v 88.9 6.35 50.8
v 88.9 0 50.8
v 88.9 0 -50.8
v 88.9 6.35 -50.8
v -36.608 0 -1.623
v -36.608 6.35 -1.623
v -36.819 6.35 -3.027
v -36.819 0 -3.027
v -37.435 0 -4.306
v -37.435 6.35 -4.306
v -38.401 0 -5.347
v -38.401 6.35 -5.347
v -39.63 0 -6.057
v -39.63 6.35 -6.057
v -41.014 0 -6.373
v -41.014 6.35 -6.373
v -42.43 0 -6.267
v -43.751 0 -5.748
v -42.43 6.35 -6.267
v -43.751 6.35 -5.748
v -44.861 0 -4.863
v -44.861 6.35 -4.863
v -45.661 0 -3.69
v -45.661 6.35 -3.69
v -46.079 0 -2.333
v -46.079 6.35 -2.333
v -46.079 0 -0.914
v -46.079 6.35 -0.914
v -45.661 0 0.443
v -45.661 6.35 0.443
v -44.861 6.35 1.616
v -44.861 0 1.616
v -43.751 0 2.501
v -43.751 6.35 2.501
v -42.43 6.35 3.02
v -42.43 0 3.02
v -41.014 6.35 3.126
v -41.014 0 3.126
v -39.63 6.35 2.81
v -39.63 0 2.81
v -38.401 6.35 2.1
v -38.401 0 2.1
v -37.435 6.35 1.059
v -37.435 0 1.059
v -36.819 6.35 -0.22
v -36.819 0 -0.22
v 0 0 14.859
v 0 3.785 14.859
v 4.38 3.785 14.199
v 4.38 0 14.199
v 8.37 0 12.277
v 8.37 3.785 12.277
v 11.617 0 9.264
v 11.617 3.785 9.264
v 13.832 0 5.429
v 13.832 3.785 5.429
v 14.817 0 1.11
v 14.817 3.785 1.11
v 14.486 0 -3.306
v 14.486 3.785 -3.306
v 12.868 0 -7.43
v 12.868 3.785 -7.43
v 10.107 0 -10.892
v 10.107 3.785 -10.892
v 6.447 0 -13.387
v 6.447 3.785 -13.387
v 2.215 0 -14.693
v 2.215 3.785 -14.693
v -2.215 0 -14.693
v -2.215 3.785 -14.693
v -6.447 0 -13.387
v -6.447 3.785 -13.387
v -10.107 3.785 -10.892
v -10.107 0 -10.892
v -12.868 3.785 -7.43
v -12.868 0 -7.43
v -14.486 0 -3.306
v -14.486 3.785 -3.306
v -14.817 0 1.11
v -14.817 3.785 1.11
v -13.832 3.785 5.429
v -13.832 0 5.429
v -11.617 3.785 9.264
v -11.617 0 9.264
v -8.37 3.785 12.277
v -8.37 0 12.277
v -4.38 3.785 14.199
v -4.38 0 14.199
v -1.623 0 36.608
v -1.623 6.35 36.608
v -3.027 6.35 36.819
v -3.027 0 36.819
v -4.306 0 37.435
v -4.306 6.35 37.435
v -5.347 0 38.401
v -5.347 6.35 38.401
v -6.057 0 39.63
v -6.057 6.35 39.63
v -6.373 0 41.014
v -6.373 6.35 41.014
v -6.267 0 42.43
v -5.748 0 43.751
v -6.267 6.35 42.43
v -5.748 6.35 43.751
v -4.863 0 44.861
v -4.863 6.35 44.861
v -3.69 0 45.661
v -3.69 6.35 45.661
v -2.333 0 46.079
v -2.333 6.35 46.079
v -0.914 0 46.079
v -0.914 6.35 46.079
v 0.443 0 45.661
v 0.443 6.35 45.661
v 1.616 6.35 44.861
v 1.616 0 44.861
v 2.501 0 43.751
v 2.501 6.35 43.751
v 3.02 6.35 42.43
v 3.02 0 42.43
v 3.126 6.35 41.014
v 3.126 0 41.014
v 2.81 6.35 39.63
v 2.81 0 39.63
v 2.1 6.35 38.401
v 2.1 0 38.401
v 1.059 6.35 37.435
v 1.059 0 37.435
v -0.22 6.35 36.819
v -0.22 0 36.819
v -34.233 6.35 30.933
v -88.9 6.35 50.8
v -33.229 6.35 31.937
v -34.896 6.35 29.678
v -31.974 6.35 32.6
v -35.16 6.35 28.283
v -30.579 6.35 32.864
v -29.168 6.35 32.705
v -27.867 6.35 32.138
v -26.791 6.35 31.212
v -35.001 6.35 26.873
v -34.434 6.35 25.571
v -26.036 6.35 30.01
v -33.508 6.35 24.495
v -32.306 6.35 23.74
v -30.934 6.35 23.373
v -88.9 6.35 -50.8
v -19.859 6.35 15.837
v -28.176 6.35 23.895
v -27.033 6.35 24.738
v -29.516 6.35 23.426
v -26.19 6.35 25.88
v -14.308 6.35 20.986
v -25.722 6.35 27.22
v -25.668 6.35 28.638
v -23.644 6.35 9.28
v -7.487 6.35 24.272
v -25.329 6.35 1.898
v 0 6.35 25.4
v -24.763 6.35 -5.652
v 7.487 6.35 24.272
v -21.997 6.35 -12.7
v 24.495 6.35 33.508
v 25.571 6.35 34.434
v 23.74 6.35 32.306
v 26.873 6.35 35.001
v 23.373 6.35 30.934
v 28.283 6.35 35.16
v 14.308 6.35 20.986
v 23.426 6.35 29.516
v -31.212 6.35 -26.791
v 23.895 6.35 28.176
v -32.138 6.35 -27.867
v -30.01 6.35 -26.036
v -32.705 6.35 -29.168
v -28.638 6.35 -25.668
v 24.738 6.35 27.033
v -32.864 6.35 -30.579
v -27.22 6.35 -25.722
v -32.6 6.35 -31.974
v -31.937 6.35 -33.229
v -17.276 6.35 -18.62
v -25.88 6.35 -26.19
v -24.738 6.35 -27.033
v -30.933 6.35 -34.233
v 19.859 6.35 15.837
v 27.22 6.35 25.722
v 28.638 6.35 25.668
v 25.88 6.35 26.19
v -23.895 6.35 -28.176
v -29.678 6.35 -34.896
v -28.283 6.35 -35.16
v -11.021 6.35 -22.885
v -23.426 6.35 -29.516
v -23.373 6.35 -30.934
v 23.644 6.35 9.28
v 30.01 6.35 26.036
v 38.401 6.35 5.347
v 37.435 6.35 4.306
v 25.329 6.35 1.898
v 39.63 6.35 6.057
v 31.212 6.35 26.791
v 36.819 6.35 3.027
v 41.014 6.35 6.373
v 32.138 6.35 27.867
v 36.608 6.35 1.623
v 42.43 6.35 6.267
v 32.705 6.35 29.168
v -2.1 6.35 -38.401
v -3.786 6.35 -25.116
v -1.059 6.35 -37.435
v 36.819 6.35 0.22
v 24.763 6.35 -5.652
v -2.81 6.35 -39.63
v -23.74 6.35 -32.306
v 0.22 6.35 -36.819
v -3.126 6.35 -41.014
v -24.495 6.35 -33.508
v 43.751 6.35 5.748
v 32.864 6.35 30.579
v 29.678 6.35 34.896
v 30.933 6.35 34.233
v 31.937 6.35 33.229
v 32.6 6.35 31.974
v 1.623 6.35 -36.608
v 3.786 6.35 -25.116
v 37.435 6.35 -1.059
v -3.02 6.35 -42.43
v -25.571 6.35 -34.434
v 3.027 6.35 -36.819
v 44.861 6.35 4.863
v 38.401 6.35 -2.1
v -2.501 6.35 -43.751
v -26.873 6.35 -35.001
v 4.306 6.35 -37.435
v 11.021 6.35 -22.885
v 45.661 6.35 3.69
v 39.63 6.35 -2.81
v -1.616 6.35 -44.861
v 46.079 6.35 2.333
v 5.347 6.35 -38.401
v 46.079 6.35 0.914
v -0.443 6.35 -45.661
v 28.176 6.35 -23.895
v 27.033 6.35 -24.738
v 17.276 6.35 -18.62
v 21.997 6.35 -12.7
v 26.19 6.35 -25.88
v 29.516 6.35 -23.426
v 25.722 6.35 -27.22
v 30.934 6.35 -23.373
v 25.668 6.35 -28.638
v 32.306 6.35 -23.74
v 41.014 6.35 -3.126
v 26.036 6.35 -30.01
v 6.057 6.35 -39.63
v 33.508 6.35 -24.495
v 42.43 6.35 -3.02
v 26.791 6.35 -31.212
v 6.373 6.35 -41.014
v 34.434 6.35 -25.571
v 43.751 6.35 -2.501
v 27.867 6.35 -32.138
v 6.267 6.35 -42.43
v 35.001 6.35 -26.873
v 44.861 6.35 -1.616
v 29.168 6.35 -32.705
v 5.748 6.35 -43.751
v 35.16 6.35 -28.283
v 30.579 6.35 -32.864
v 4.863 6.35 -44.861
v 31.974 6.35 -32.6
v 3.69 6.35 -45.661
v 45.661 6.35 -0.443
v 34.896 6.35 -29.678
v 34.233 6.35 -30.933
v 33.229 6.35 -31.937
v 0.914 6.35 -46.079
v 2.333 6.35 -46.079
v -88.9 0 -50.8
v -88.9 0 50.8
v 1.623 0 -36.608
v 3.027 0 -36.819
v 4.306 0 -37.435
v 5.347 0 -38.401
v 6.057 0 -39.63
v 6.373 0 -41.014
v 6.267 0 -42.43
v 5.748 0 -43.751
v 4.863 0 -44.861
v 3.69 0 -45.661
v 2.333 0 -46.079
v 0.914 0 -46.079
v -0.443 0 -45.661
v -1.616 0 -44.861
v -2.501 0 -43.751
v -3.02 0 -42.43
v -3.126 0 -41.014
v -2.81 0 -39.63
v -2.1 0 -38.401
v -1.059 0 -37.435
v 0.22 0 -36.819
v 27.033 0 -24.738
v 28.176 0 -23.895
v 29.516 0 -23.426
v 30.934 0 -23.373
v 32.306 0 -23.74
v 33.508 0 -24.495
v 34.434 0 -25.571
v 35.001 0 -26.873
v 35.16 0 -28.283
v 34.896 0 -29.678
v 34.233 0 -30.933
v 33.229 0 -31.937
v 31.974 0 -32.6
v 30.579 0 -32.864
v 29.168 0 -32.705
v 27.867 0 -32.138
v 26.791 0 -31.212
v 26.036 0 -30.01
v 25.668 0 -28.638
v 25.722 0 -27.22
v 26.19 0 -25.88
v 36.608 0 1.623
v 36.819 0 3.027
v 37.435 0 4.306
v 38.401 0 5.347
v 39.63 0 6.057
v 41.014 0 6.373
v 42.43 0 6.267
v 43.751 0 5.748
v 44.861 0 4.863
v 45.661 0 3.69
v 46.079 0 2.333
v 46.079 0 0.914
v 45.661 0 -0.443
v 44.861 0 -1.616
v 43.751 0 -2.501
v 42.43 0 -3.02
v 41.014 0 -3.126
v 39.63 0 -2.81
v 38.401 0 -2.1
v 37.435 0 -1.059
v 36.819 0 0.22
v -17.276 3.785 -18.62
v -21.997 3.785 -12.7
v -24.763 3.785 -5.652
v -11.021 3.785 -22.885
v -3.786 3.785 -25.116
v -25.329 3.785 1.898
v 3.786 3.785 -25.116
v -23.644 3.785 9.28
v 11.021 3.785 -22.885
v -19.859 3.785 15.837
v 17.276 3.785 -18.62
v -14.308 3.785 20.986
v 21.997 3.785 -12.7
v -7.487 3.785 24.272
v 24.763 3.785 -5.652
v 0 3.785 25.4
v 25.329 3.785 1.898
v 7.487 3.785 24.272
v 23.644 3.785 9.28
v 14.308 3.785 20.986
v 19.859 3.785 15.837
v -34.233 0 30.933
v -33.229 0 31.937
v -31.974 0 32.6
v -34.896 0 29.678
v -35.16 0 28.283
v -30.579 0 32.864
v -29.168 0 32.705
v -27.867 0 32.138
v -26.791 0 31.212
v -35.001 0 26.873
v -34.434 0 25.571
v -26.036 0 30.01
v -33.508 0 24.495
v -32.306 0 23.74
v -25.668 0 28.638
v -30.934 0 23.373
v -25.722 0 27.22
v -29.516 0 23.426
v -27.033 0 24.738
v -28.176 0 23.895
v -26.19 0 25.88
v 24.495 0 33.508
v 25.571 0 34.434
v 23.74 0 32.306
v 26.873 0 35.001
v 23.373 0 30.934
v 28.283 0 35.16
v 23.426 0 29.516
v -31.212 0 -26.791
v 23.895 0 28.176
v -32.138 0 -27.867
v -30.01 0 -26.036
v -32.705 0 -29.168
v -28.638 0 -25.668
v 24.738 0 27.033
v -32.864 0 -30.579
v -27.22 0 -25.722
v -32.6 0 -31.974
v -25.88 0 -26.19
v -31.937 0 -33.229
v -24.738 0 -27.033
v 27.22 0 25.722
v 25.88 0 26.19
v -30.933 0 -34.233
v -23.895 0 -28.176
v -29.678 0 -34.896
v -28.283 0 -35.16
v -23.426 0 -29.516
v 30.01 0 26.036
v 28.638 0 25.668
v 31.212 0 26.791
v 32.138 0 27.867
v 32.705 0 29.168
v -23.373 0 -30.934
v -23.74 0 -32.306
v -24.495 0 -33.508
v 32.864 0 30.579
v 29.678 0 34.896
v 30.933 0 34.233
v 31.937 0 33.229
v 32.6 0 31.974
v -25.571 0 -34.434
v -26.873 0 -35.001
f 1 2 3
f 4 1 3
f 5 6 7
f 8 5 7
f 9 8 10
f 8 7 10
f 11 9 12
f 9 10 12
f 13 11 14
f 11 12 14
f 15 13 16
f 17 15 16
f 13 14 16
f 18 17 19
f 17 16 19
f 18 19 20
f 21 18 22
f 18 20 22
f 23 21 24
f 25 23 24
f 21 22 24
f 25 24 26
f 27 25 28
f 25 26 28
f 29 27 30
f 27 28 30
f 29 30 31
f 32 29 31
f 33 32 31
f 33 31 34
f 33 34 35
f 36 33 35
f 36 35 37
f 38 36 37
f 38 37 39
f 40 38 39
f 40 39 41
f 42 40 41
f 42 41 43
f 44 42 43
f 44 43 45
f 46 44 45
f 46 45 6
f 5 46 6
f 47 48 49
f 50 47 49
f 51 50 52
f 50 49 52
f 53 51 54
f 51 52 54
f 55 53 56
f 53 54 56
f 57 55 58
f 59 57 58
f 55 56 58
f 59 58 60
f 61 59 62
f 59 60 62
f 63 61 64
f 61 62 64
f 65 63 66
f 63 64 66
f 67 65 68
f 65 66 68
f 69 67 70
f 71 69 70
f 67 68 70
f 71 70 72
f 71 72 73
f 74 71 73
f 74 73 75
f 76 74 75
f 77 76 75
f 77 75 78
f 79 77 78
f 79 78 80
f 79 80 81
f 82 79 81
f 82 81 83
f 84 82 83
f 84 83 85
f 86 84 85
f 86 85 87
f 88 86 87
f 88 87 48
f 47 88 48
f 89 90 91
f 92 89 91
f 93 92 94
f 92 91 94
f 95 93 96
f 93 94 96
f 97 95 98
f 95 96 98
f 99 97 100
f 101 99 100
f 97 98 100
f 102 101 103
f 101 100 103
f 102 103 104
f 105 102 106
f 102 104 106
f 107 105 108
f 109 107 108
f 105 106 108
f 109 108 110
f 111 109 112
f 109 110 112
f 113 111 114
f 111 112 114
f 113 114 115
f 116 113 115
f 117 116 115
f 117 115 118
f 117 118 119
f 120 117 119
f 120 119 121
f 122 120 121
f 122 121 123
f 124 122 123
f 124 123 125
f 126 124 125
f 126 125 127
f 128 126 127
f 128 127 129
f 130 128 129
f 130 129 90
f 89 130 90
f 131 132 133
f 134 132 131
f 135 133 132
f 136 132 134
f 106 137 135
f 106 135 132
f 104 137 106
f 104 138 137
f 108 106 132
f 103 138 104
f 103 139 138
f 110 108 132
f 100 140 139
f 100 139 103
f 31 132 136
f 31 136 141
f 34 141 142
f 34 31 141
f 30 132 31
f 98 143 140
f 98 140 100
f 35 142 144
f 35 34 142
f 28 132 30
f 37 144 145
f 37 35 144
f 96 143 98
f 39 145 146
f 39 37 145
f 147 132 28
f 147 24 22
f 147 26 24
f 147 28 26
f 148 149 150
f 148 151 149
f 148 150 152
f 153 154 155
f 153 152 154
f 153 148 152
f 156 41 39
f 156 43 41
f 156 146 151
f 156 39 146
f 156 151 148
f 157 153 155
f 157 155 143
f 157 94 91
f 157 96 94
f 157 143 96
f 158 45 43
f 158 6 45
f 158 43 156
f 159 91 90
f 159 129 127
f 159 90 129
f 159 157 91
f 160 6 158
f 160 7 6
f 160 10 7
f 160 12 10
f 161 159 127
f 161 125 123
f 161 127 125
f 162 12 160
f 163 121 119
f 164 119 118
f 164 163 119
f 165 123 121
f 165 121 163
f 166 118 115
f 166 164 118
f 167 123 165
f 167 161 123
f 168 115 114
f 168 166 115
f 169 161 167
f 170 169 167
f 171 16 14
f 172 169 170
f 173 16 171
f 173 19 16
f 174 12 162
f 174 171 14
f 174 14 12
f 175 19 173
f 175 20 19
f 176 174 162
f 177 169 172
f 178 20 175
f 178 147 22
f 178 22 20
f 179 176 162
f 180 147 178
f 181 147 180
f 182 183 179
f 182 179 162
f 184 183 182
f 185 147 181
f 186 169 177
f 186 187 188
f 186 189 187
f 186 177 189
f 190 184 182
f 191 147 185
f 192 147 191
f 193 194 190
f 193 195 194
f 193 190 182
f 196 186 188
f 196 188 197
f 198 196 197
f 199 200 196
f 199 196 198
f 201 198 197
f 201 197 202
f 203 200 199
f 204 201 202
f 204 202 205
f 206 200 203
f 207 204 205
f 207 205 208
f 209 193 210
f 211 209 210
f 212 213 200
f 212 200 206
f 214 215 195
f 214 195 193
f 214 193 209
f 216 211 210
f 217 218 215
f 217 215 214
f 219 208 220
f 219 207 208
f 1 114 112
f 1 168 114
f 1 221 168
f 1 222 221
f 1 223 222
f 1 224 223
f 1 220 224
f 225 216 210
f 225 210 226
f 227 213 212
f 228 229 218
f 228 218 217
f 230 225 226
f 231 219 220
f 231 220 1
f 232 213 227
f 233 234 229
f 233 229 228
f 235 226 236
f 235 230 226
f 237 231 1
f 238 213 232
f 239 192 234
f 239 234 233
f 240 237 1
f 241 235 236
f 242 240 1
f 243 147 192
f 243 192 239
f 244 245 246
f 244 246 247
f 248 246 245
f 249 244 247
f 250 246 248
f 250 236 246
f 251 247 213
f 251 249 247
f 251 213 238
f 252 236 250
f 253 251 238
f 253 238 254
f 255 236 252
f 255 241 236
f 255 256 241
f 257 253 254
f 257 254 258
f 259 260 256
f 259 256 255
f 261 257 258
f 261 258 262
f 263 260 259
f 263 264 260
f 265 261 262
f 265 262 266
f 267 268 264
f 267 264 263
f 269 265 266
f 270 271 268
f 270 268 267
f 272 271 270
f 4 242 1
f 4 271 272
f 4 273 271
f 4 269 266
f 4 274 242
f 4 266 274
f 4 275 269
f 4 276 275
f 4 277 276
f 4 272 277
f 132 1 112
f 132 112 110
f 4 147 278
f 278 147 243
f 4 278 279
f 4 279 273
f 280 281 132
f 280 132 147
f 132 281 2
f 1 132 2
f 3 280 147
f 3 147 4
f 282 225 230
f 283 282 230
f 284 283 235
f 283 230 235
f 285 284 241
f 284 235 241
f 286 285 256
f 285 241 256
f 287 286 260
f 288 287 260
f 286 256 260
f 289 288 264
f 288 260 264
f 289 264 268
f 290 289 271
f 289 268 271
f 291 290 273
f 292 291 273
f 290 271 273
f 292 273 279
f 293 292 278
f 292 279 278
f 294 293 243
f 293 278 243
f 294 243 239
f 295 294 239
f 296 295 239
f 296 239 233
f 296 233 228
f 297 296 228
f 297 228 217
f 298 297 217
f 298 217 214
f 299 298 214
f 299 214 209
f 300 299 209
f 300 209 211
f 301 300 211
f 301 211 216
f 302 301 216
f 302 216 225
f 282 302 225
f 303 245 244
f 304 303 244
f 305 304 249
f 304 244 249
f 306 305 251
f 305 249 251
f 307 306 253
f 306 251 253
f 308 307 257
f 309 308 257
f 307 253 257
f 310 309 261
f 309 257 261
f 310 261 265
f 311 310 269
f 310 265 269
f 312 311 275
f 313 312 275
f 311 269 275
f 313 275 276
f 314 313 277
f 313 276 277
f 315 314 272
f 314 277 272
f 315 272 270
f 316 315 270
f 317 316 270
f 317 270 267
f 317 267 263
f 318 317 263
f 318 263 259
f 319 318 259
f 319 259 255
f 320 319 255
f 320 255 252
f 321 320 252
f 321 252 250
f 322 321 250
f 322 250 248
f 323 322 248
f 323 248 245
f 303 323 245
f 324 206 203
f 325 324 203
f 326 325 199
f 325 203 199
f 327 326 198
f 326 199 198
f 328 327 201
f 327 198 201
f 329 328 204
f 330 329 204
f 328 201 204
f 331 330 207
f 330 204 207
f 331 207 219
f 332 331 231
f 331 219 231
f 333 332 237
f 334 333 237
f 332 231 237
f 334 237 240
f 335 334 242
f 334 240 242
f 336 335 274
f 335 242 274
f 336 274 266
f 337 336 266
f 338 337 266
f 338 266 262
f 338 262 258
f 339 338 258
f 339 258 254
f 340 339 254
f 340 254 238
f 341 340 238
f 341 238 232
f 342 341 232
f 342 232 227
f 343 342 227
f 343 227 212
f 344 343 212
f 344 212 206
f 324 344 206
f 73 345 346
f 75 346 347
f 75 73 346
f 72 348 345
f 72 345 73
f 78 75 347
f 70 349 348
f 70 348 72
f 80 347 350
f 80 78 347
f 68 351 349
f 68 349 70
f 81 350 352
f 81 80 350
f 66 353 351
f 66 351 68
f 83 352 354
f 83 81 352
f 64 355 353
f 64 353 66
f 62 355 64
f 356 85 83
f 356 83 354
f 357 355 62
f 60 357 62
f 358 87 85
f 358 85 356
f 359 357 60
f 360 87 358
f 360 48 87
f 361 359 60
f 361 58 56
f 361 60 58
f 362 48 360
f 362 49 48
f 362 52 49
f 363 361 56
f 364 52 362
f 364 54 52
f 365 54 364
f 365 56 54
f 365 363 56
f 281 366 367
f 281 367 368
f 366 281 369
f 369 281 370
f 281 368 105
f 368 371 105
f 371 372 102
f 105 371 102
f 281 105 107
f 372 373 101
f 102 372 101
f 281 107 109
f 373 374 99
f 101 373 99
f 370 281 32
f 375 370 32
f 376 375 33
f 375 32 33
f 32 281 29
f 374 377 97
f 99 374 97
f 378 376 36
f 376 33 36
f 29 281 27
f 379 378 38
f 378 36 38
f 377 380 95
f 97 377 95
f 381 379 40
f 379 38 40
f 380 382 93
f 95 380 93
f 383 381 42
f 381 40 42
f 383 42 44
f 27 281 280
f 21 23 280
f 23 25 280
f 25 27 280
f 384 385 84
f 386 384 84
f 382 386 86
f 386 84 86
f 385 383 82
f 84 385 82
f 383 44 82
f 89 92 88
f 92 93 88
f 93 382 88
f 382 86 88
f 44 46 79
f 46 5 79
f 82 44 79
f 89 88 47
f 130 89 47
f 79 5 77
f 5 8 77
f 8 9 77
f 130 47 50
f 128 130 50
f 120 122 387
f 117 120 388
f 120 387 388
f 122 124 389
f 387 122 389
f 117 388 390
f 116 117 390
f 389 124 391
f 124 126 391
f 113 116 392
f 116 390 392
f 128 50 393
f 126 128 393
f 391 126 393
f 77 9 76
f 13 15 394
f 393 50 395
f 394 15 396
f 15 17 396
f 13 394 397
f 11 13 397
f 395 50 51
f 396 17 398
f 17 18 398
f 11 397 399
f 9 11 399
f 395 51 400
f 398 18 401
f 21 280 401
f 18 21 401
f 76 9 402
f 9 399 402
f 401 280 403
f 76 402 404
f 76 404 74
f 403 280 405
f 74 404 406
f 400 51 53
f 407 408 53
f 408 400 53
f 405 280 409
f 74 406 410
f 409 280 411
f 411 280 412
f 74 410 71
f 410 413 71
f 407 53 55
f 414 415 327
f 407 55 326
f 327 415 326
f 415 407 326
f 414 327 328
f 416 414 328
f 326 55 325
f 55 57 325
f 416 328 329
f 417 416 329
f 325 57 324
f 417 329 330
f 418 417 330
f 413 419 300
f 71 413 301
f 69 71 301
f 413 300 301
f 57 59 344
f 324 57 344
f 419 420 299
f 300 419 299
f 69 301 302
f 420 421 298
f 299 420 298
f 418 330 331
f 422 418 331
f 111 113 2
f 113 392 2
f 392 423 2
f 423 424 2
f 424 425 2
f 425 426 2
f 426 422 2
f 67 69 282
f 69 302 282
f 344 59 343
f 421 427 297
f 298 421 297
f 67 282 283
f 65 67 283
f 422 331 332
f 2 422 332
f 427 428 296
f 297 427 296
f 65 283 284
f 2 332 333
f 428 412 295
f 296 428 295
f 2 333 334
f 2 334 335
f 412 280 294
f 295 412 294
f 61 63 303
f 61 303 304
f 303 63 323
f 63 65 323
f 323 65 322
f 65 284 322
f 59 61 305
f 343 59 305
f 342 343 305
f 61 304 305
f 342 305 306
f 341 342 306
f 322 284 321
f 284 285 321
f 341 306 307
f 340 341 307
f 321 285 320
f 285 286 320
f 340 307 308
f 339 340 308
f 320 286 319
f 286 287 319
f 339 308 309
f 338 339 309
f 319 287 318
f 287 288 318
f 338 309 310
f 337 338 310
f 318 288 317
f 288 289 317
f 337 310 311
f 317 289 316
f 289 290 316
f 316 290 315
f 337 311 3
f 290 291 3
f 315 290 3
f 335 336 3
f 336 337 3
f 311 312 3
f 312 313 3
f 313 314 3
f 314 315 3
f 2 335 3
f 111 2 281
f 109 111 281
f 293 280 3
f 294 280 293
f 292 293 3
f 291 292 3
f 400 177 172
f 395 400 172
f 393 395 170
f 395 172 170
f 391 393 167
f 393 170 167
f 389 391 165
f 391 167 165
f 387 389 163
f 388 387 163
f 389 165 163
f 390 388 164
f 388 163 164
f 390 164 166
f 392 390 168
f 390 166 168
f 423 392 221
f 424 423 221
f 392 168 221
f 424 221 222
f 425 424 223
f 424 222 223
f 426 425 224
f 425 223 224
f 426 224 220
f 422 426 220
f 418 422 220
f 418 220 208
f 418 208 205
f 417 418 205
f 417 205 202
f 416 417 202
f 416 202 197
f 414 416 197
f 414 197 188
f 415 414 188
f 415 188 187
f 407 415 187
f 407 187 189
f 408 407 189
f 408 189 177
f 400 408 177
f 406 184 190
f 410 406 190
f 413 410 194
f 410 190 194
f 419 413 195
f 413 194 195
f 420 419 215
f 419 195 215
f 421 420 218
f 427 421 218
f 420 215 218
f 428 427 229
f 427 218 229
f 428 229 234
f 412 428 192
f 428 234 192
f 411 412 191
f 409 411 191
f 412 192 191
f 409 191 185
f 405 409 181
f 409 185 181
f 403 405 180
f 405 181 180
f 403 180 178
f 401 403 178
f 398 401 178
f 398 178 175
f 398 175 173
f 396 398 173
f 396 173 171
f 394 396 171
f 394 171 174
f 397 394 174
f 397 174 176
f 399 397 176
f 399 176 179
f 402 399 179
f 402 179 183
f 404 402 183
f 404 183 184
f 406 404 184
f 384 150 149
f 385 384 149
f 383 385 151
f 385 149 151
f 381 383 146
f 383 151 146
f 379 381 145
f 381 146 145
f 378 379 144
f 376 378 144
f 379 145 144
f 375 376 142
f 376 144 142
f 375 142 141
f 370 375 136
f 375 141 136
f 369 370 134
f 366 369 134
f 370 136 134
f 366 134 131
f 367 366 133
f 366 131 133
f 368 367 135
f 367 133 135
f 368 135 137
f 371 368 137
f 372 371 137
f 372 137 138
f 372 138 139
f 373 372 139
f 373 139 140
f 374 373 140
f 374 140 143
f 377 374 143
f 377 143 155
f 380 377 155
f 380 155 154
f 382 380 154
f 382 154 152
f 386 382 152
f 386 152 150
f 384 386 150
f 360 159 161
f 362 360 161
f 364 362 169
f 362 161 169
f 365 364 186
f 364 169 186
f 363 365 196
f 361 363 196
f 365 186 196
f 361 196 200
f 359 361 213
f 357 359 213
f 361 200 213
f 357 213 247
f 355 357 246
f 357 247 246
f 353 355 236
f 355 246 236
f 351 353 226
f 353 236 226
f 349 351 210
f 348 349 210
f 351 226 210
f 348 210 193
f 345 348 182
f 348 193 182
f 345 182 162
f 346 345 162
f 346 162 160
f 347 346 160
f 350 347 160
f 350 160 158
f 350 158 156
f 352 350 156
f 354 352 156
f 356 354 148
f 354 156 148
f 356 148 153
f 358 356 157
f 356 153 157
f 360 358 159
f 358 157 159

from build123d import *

# Parameters (mm, degrees)
SKETCH1_W           = 177.8
SKETCH1_H           = 101.6
BOSS_EXTRUDE1_DEPTH = 6.35
SKETCH2_R           = 14.859
CUT_EXTRUDE1_DEPTH  = 6.35
SKETCH3_R           = 25.4
CUT_EXTRUDE2_DEPTH  = 2.5654
SKETCH4_R           = 4.7625
CUT_EXTRUDE3_DEPTH  = 20.3454
CIRPATTERN1_COUNT   = 8


with BuildPart() as part:
    # Sketch1 → Boss-Extrude1 (new body)
    with BuildSketch(Plane(origin=(0, 0, 0), x_dir=(1, 0, 0), z_dir=(0, 1, 0))):
        Rectangle(SKETCH1_W, SKETCH1_H)
    extrude(amount=BOSS_EXTRUDE1_DEPTH)

    # Sketch2 → Cut-Extrude1 (cut)
    with BuildSketch(Plane(origin=(0, 6.35, 0), x_dir=(1, 0, 0), z_dir=(0, 1, 0))):
        with Locations(Location((0, 0, 0), (0, 0, 270))):
            Circle(SKETCH2_R)
    extrude(amount=-CUT_EXTRUDE1_DEPTH, mode=Mode.SUBTRACT)

    # Sketch3 → Cut-Extrude2 (cut)
    with BuildSketch(Plane(origin=(0, 6.35, 0), x_dir=(1, 0, 0), z_dir=(0, 1, 0))):
        with Locations(Location((0, 0, 0), (0, 0, 270))):
            Circle(SKETCH3_R)
    extrude(amount=-CUT_EXTRUDE2_DEPTH, mode=Mode.SUBTRACT)

    # Sketch4 → Cut-Extrude3 (cut)
    with BuildSketch(Plane(origin=(0, 6.35, 0), x_dir=(1, 0, 0), z_dir=(0, 1, 0))):
        with Locations(Location((1.623422677, 41.37015957, 0), (0, 0, 270))):
            Circle(SKETCH4_R)
    cut_extrude3 = extrude(amount=-CUT_EXTRUDE3_DEPTH, mode=Mode.SUBTRACT)

    # CirPattern1: Cut-Extrude3 ×8 about axis
    cirpattern1_axis = Axis((0, 0, 0), (0, 1, 0))
    for i in range(1, CIRPATTERN1_COUNT):
        add(cut_extrude3.rotate(cirpattern1_axis, i * 360 / CIRPATTERN1_COUNT), mode=Mode.SUBTRACT)


solid = part.part
